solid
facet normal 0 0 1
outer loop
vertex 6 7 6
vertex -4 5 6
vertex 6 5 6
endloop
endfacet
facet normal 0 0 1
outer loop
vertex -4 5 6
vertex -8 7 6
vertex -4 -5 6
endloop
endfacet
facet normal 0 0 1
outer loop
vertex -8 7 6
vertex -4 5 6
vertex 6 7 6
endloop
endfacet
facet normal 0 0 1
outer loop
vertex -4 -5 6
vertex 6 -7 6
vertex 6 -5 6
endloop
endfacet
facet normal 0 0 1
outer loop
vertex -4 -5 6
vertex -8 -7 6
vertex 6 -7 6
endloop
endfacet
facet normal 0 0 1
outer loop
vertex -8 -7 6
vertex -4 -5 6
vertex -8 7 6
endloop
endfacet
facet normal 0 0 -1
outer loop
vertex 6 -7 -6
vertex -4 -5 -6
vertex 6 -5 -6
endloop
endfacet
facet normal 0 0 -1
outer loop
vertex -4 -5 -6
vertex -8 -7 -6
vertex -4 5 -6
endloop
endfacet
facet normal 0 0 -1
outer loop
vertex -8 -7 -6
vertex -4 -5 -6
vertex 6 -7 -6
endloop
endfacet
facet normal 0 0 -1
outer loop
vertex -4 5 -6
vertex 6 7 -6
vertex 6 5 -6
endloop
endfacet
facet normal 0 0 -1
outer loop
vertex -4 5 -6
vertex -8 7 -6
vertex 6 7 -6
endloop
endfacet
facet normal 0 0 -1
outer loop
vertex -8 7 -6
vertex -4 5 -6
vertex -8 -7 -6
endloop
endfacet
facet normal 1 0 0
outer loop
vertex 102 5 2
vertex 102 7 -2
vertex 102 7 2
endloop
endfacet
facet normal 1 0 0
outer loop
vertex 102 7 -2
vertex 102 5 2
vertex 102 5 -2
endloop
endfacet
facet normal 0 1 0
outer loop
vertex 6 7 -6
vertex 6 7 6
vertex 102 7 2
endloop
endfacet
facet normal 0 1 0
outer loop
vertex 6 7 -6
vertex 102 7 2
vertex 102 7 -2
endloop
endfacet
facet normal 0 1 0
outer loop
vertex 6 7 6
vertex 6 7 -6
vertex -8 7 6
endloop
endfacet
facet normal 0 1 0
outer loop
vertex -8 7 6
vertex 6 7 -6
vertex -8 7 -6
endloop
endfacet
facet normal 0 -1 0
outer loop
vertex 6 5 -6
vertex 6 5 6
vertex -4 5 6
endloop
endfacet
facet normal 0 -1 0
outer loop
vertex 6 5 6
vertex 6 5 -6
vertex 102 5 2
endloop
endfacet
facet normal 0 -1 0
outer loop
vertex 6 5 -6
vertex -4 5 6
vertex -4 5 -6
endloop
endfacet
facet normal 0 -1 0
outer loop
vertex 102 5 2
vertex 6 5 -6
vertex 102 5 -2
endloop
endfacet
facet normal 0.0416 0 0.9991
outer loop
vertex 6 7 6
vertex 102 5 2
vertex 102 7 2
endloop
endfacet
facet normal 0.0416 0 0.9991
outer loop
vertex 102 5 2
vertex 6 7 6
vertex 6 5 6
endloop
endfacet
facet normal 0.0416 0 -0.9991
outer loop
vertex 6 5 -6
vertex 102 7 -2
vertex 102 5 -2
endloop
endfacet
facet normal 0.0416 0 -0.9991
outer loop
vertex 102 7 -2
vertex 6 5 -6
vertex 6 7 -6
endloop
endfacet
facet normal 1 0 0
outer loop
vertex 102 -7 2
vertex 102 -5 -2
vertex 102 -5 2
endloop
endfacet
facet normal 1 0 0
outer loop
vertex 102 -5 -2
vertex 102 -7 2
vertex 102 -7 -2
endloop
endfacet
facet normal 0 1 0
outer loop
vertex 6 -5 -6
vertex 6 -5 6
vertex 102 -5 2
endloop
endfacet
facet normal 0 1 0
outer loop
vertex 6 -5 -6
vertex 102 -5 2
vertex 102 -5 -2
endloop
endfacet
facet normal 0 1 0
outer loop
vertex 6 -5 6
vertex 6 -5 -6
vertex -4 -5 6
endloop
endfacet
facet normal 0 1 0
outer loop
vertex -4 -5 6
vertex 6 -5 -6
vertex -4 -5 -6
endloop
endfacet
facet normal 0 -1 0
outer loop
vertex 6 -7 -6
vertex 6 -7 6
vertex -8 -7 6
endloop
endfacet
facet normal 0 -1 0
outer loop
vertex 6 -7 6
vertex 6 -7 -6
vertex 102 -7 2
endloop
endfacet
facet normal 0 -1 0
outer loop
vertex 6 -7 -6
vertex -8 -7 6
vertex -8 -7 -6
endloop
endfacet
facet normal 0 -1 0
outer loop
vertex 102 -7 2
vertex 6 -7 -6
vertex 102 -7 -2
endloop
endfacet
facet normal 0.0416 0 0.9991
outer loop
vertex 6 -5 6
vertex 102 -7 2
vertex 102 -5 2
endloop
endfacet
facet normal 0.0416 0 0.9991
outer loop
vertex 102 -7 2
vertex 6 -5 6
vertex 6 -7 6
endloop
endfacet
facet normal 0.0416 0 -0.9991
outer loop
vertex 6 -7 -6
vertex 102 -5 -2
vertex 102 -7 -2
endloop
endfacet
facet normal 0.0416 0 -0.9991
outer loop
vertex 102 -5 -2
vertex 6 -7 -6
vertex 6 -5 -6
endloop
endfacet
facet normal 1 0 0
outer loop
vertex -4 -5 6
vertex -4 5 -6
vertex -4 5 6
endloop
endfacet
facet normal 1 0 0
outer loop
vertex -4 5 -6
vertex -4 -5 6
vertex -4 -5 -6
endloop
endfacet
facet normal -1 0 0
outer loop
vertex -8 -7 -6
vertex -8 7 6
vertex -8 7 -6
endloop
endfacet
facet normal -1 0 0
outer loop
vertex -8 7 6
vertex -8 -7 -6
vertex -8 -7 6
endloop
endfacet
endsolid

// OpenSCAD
// Tweezers: two flat arms joined at a bridge, class A standalone part.
// Licence: CC0 1.0. Authored for the michani demo, 2026. Reference for the part family:
// Field Ready medical item collection.

// Overall length from bridge to tip
length = 100; // [60:160]
// Width of the flat tip
tip_width = 4; // [2:8]
// Thickness of each arm
arm_thickness = 2; // [1.2:4]
// Gap between the arms at the tips when at rest
arm_gap = 10; // [4:20]
// Width of each arm at the bridge end
arm_width = 12; // [8:20]

$fn = 32;

module arm(side) {
  // A tapered plate: full width at the bridge, tip width at the end, leaning inward
  // by half the gap so the tips nearly meet when squeezed.
  hull() {
    translate([0, side * (arm_gap / 2 + arm_thickness / 2), 0])
      cube([arm_width, arm_thickness, arm_width], center = true);
    translate([length, side * (arm_gap / 2 + arm_thickness / 2), 0])
      cube([tip_width, arm_thickness, tip_width], center = true);
  }
}

module bridge() {
  // Closed end that joins the two arms and gives the spring action.
  translate([-arm_width / 2, 0, 0])
    cube([arm_thickness * 2, arm_gap + arm_thickness * 2, arm_width], center = true);
}

union() {
  arm(1);
  arm(-1);
  bridge();
}
